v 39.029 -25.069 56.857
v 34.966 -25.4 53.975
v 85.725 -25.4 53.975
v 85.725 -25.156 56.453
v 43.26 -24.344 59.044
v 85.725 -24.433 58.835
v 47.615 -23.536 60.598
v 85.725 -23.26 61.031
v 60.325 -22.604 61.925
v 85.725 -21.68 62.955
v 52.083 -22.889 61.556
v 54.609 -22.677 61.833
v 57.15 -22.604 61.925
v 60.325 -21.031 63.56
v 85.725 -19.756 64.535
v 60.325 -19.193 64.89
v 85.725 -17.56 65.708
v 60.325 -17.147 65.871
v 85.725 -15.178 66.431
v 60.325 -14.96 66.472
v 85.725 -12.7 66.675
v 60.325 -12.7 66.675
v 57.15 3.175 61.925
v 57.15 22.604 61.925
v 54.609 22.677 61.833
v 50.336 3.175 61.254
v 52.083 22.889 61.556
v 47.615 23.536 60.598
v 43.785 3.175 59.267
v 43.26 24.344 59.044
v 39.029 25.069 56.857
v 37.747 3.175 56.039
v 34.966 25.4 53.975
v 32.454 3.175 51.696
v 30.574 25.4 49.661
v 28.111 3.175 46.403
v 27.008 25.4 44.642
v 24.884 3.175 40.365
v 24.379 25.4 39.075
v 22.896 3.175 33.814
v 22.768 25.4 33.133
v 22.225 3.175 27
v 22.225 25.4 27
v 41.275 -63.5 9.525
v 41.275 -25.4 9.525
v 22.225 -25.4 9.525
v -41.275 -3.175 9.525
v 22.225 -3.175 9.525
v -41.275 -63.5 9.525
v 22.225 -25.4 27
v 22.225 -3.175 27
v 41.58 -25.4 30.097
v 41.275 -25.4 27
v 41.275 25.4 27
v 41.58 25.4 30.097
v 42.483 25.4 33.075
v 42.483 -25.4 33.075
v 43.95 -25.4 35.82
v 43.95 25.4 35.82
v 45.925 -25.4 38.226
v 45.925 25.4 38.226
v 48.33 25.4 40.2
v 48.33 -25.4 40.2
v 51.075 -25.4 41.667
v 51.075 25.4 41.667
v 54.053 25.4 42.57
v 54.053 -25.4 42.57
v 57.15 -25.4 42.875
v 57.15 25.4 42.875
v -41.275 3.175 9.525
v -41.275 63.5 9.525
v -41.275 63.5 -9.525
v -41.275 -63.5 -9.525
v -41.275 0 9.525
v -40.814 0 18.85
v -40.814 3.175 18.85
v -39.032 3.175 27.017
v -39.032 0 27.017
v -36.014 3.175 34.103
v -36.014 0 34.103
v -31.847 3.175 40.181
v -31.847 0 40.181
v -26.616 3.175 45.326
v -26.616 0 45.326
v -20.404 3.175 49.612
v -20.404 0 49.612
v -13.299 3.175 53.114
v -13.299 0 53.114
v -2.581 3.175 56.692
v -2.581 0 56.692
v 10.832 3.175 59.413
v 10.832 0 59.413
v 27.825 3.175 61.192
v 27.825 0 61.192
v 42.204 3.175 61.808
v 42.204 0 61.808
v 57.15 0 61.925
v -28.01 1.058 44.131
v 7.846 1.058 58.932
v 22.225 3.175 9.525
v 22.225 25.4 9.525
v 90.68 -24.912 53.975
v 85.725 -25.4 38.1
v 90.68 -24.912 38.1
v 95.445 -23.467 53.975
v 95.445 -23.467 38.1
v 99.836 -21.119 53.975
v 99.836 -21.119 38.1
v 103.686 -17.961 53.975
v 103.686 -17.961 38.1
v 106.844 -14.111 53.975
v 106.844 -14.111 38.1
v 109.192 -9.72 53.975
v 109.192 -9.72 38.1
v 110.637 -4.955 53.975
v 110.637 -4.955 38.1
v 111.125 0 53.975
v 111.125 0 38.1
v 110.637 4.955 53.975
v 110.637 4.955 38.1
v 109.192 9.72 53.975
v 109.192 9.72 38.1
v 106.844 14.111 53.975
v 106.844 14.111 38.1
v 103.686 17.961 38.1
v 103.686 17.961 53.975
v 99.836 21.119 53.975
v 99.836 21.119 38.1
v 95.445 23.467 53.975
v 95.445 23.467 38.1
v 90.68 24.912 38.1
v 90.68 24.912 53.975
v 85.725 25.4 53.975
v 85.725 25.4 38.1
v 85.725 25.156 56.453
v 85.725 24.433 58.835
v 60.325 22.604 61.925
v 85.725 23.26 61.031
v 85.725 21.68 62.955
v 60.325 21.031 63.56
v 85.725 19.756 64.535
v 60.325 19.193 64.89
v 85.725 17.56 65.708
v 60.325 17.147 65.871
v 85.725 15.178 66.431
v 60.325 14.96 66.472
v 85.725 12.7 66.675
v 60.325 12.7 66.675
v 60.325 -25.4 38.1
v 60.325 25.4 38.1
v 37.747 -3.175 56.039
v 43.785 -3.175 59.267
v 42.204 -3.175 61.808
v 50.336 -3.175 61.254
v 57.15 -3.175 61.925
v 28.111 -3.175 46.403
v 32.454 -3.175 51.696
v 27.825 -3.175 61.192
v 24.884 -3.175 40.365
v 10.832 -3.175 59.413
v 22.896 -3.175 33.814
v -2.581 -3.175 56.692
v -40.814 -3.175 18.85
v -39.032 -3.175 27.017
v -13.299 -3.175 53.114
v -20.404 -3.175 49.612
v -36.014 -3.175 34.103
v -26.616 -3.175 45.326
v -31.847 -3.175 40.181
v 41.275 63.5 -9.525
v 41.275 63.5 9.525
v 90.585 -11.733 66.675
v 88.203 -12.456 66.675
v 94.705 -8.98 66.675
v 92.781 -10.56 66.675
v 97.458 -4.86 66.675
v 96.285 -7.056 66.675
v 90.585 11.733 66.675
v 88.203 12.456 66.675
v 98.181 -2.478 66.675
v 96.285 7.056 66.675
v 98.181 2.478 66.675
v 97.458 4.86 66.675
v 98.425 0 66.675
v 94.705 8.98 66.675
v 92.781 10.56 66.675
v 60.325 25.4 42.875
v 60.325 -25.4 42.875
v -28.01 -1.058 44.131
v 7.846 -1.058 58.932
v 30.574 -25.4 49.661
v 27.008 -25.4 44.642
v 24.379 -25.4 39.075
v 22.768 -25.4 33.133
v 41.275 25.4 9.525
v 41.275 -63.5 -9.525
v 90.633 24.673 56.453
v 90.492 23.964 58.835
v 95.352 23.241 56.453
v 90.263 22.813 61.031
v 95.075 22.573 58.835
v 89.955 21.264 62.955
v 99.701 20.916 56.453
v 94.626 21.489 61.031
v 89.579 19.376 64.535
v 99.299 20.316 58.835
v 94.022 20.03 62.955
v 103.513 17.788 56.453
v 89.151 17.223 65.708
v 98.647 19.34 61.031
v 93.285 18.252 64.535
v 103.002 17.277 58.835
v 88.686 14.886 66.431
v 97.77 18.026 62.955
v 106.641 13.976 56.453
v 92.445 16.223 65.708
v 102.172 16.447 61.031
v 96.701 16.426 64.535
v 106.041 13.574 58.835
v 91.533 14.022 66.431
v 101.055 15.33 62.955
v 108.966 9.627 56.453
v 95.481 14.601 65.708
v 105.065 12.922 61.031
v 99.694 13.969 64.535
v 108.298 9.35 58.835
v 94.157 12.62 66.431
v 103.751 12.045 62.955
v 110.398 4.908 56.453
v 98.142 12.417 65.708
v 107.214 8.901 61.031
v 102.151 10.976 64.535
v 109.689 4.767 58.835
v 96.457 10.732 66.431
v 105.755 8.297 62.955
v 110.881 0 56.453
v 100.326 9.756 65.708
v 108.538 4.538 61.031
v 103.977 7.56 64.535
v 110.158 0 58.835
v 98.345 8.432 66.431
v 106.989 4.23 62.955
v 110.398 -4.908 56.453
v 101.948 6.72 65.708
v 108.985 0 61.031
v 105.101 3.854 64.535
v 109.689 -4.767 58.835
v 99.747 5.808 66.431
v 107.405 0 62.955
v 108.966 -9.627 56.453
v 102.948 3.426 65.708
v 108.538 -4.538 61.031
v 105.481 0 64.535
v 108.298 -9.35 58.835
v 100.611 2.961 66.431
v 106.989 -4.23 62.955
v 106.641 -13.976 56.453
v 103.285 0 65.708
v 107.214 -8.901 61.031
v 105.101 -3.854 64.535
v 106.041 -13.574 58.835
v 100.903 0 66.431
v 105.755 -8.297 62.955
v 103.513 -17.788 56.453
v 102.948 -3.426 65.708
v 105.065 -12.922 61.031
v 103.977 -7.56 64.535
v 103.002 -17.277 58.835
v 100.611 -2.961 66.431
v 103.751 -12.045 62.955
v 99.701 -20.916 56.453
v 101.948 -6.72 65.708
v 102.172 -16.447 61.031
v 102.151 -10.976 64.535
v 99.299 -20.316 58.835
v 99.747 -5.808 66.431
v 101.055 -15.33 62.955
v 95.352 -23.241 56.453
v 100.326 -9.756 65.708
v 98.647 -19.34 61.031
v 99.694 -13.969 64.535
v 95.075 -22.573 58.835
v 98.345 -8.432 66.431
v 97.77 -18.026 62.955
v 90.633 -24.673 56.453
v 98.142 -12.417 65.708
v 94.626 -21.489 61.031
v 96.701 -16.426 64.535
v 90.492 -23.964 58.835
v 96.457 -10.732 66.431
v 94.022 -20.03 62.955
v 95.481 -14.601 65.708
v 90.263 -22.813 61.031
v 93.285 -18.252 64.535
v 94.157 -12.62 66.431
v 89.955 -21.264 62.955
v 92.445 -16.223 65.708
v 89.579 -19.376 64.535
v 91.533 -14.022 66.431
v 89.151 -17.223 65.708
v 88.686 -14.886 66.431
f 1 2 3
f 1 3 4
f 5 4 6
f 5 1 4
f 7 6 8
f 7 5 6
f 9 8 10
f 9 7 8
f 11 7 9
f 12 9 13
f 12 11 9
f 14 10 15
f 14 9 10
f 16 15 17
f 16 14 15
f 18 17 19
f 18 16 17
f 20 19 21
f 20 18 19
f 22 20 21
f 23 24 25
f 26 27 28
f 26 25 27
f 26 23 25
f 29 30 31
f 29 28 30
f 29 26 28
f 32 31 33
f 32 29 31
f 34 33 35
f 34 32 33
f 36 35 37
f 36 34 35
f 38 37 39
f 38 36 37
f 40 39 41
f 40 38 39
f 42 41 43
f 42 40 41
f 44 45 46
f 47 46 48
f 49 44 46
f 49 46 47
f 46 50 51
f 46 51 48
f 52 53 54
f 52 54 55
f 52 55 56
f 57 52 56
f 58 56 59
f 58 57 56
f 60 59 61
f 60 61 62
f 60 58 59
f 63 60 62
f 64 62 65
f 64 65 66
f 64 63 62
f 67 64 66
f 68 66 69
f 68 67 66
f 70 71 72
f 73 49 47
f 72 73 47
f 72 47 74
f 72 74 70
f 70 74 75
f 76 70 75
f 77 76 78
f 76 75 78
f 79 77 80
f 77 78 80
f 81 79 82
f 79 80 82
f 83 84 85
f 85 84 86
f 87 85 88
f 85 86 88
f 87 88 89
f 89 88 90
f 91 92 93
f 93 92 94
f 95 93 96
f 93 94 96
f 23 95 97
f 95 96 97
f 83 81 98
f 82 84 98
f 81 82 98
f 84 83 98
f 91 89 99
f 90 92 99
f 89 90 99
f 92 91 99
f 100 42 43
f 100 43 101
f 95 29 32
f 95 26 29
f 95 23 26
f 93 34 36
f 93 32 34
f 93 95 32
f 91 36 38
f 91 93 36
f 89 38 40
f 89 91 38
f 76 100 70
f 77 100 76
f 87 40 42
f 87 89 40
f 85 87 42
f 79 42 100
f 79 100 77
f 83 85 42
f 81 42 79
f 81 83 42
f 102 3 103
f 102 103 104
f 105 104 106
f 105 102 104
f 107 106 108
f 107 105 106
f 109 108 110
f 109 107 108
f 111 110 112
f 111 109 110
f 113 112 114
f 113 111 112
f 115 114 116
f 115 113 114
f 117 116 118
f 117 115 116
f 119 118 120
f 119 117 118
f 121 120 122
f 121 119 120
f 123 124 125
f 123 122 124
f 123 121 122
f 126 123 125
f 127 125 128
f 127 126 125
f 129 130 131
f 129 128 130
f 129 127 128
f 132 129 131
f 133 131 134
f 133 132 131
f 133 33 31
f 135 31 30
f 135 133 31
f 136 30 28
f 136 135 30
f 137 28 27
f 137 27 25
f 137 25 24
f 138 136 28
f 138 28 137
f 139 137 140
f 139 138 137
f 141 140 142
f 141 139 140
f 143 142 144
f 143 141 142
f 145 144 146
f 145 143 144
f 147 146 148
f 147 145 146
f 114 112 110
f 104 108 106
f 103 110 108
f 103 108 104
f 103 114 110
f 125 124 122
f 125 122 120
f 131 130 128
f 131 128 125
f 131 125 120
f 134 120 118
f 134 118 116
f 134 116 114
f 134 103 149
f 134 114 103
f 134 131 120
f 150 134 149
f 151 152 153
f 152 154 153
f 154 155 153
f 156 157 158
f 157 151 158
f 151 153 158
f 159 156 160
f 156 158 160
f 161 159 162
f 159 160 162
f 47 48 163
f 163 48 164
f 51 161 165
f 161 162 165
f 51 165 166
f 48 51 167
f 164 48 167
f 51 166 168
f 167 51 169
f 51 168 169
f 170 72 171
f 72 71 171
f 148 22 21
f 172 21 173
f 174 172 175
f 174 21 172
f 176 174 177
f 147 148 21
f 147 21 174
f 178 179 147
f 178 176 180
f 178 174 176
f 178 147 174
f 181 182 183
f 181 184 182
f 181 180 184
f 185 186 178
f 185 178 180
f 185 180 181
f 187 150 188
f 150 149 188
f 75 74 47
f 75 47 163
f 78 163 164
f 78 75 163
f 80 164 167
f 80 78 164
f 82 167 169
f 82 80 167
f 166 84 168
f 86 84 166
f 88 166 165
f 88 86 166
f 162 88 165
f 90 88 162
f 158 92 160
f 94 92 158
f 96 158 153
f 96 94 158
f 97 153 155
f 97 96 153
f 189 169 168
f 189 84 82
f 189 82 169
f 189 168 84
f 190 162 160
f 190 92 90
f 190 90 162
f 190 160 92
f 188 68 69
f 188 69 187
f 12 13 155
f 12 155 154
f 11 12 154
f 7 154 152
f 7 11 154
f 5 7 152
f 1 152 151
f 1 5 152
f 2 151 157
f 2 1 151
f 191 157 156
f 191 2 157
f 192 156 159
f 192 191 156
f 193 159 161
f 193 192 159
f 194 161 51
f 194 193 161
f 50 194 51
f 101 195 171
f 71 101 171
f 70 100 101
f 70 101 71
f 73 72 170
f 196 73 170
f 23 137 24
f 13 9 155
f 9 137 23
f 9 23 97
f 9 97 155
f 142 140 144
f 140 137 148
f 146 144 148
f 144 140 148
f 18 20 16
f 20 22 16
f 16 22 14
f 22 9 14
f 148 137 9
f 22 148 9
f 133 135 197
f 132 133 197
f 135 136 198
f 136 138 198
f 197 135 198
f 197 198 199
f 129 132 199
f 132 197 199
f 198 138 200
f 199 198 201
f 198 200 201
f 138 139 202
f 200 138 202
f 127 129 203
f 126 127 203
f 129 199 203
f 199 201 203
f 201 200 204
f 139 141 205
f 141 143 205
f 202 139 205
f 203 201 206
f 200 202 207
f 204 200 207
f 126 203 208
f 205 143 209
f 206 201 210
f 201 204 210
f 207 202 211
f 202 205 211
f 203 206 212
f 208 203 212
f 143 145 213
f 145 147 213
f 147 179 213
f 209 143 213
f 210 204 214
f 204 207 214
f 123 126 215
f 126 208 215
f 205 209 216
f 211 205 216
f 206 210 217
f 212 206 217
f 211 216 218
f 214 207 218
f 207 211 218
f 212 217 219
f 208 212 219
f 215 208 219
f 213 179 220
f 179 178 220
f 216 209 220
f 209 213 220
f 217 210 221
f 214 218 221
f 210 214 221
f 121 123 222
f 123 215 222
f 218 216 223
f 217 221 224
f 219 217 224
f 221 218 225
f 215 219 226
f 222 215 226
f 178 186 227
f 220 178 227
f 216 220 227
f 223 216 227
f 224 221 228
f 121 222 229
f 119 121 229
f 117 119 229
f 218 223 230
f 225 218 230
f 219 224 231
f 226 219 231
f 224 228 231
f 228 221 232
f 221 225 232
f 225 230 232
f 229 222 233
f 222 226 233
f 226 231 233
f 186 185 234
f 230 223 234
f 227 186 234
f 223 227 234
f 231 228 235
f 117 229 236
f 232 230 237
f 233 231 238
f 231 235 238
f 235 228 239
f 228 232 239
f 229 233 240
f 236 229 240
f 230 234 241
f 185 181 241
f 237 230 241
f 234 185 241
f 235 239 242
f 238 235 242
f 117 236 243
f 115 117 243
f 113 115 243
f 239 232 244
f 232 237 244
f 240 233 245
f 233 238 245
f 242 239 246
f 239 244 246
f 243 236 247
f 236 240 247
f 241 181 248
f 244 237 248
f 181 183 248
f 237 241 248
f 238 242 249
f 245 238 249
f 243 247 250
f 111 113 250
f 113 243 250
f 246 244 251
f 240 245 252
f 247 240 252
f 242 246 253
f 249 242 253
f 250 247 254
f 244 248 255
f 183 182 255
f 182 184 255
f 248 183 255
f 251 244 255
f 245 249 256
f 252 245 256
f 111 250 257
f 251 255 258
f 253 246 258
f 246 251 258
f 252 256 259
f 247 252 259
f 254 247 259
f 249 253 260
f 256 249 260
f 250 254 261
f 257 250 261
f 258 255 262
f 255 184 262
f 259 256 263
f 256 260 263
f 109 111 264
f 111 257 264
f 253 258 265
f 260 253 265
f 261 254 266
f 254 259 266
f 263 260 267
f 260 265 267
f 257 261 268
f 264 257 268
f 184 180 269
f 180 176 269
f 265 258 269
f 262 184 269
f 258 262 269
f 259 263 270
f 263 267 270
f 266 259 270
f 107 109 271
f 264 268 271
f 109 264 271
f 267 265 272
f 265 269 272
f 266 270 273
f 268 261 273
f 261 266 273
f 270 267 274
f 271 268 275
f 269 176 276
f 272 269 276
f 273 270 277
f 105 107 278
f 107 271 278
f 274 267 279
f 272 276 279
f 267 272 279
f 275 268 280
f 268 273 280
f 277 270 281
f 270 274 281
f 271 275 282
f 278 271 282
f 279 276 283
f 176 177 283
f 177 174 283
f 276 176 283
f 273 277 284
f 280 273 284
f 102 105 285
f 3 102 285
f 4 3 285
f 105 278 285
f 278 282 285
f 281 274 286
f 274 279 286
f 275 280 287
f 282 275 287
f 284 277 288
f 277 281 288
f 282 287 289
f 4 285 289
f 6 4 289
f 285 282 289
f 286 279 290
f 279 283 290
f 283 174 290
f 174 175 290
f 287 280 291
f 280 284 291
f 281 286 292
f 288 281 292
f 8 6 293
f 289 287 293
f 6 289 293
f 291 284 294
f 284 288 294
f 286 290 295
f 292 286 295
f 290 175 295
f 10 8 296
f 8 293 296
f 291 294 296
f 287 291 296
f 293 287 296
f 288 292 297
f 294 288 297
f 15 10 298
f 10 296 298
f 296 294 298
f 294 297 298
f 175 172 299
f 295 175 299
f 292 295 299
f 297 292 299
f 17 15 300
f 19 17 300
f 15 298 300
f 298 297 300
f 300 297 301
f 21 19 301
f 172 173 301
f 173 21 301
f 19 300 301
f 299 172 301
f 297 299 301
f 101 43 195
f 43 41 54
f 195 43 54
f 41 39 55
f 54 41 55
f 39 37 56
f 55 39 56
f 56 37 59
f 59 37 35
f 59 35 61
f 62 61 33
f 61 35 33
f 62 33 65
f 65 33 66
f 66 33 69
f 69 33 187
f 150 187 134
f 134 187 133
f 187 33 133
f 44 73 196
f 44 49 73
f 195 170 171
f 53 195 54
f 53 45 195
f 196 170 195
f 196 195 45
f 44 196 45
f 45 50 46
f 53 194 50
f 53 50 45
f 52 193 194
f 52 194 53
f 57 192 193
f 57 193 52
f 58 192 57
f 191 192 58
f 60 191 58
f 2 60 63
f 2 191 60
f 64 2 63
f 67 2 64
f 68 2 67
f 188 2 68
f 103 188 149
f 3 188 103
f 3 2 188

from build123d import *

# Parameters (mm, degrees)
F1_DEPTH = 63.5
F0_W     = 25.4
F0_H     = 19.05
F0_H_2   = 4.7752
F0_H_3   = 4.7498
F2_DEPTH = 25.4
F4_DEPTH = 3.175
F5_R     = 12.7


with BuildPart() as f1:
    # F0 (on Front) → F1 (new body, symmetric)
    with BuildSketch(Plane.XZ):
        Polygon((-41.275, -9.525), (41.275, -9.525), (41.275, 9.525), (22.225, 9.525), (-41.275, 9.525), align=None)
    extrude(amount=F1_DEPTH, both=True)

    # F0 (on Front) → F2 (join, symmetric)
    with BuildSketch(Plane.XZ):
        with BuildLine():
            Line((22.225, 9.525), (41.275, 9.525))
            Line((41.275, 9.525), (41.275, 27.0002))
            ThreePointArc((41.275, 27.0002), (45.9246798487, 38.2255201513), (57.15, 42.8752))
            Line((57.15, 42.8752), (60.325, 42.8752))
            Line((60.325, 42.8752), (60.325, 61.9252))
            Line((60.325, 61.9252), (57.15, 61.9252))
            ThreePointArc((57.15, 61.9252), (32.4542956671, 51.6959043329), (22.225, 27.0002))
            Line((22.225, 27.0002), (22.225, 9.525))
        make_face()
        with Locations((73.025, 52.4002)):
            Rectangle(F0_W, F0_H)
        with Locations((73.025, 40.4876)):
            Rectangle(F0_W, F0_H_2)
        with Locations((73.025, 64.3001)):
            Rectangle(F0_W, F0_H_3)
    extrude(amount=F2_DEPTH, both=True)

    # F0 (on Front) → F3 (revolve)
    with BuildSketch(Plane.XZ):
        Polygon((85.725, 66.675), (85.725, 61.9252), (85.725, 42.8752), (85.725, 38.1), (111.125, 38.1), (111.125, 66.675), align=None)
    revolve(axis=Axis((85.725, 0, 52.3875), (0, 0, 1)))

    # F0 (on Front) → F4 (join, symmetric)
    with BuildSketch(Plane.XZ):
        with BuildLine():
            add(Edge.make_bspline(
                [(-41.275, 9.525), (-42.3543564975, 56.6976591945), (4.171225708, 62.171254307), (57.15, 61.9252)],
                knots=[0, 0, 0, 0, 111.5045361635, 111.5045361635, 111.5045361635, 111.5045361635], degree=3))
            Line((-41.275, 9.525), (22.225, 9.525))
            Line((22.225, 9.525), (22.225, 27.0002))
            ThreePointArc((22.225, 27.0002), (32.4542956671, 51.6959043329), (57.15, 61.9252))
        make_face()
    extrude(amount=F4_DEPTH, both=True)

    # F5
    f5_edges = [f1.edges().sort_by_distance(p)[0] for p in [
        (85.725, 25.4, 52.3875),
        (73.025, 25.4, 66.675),
        (73.025, -25.4, 66.675),
        (111.125, 0, 66.675),
    ]]
    fillet(f5_edges, radius=F5_R)


solid = f1.part
